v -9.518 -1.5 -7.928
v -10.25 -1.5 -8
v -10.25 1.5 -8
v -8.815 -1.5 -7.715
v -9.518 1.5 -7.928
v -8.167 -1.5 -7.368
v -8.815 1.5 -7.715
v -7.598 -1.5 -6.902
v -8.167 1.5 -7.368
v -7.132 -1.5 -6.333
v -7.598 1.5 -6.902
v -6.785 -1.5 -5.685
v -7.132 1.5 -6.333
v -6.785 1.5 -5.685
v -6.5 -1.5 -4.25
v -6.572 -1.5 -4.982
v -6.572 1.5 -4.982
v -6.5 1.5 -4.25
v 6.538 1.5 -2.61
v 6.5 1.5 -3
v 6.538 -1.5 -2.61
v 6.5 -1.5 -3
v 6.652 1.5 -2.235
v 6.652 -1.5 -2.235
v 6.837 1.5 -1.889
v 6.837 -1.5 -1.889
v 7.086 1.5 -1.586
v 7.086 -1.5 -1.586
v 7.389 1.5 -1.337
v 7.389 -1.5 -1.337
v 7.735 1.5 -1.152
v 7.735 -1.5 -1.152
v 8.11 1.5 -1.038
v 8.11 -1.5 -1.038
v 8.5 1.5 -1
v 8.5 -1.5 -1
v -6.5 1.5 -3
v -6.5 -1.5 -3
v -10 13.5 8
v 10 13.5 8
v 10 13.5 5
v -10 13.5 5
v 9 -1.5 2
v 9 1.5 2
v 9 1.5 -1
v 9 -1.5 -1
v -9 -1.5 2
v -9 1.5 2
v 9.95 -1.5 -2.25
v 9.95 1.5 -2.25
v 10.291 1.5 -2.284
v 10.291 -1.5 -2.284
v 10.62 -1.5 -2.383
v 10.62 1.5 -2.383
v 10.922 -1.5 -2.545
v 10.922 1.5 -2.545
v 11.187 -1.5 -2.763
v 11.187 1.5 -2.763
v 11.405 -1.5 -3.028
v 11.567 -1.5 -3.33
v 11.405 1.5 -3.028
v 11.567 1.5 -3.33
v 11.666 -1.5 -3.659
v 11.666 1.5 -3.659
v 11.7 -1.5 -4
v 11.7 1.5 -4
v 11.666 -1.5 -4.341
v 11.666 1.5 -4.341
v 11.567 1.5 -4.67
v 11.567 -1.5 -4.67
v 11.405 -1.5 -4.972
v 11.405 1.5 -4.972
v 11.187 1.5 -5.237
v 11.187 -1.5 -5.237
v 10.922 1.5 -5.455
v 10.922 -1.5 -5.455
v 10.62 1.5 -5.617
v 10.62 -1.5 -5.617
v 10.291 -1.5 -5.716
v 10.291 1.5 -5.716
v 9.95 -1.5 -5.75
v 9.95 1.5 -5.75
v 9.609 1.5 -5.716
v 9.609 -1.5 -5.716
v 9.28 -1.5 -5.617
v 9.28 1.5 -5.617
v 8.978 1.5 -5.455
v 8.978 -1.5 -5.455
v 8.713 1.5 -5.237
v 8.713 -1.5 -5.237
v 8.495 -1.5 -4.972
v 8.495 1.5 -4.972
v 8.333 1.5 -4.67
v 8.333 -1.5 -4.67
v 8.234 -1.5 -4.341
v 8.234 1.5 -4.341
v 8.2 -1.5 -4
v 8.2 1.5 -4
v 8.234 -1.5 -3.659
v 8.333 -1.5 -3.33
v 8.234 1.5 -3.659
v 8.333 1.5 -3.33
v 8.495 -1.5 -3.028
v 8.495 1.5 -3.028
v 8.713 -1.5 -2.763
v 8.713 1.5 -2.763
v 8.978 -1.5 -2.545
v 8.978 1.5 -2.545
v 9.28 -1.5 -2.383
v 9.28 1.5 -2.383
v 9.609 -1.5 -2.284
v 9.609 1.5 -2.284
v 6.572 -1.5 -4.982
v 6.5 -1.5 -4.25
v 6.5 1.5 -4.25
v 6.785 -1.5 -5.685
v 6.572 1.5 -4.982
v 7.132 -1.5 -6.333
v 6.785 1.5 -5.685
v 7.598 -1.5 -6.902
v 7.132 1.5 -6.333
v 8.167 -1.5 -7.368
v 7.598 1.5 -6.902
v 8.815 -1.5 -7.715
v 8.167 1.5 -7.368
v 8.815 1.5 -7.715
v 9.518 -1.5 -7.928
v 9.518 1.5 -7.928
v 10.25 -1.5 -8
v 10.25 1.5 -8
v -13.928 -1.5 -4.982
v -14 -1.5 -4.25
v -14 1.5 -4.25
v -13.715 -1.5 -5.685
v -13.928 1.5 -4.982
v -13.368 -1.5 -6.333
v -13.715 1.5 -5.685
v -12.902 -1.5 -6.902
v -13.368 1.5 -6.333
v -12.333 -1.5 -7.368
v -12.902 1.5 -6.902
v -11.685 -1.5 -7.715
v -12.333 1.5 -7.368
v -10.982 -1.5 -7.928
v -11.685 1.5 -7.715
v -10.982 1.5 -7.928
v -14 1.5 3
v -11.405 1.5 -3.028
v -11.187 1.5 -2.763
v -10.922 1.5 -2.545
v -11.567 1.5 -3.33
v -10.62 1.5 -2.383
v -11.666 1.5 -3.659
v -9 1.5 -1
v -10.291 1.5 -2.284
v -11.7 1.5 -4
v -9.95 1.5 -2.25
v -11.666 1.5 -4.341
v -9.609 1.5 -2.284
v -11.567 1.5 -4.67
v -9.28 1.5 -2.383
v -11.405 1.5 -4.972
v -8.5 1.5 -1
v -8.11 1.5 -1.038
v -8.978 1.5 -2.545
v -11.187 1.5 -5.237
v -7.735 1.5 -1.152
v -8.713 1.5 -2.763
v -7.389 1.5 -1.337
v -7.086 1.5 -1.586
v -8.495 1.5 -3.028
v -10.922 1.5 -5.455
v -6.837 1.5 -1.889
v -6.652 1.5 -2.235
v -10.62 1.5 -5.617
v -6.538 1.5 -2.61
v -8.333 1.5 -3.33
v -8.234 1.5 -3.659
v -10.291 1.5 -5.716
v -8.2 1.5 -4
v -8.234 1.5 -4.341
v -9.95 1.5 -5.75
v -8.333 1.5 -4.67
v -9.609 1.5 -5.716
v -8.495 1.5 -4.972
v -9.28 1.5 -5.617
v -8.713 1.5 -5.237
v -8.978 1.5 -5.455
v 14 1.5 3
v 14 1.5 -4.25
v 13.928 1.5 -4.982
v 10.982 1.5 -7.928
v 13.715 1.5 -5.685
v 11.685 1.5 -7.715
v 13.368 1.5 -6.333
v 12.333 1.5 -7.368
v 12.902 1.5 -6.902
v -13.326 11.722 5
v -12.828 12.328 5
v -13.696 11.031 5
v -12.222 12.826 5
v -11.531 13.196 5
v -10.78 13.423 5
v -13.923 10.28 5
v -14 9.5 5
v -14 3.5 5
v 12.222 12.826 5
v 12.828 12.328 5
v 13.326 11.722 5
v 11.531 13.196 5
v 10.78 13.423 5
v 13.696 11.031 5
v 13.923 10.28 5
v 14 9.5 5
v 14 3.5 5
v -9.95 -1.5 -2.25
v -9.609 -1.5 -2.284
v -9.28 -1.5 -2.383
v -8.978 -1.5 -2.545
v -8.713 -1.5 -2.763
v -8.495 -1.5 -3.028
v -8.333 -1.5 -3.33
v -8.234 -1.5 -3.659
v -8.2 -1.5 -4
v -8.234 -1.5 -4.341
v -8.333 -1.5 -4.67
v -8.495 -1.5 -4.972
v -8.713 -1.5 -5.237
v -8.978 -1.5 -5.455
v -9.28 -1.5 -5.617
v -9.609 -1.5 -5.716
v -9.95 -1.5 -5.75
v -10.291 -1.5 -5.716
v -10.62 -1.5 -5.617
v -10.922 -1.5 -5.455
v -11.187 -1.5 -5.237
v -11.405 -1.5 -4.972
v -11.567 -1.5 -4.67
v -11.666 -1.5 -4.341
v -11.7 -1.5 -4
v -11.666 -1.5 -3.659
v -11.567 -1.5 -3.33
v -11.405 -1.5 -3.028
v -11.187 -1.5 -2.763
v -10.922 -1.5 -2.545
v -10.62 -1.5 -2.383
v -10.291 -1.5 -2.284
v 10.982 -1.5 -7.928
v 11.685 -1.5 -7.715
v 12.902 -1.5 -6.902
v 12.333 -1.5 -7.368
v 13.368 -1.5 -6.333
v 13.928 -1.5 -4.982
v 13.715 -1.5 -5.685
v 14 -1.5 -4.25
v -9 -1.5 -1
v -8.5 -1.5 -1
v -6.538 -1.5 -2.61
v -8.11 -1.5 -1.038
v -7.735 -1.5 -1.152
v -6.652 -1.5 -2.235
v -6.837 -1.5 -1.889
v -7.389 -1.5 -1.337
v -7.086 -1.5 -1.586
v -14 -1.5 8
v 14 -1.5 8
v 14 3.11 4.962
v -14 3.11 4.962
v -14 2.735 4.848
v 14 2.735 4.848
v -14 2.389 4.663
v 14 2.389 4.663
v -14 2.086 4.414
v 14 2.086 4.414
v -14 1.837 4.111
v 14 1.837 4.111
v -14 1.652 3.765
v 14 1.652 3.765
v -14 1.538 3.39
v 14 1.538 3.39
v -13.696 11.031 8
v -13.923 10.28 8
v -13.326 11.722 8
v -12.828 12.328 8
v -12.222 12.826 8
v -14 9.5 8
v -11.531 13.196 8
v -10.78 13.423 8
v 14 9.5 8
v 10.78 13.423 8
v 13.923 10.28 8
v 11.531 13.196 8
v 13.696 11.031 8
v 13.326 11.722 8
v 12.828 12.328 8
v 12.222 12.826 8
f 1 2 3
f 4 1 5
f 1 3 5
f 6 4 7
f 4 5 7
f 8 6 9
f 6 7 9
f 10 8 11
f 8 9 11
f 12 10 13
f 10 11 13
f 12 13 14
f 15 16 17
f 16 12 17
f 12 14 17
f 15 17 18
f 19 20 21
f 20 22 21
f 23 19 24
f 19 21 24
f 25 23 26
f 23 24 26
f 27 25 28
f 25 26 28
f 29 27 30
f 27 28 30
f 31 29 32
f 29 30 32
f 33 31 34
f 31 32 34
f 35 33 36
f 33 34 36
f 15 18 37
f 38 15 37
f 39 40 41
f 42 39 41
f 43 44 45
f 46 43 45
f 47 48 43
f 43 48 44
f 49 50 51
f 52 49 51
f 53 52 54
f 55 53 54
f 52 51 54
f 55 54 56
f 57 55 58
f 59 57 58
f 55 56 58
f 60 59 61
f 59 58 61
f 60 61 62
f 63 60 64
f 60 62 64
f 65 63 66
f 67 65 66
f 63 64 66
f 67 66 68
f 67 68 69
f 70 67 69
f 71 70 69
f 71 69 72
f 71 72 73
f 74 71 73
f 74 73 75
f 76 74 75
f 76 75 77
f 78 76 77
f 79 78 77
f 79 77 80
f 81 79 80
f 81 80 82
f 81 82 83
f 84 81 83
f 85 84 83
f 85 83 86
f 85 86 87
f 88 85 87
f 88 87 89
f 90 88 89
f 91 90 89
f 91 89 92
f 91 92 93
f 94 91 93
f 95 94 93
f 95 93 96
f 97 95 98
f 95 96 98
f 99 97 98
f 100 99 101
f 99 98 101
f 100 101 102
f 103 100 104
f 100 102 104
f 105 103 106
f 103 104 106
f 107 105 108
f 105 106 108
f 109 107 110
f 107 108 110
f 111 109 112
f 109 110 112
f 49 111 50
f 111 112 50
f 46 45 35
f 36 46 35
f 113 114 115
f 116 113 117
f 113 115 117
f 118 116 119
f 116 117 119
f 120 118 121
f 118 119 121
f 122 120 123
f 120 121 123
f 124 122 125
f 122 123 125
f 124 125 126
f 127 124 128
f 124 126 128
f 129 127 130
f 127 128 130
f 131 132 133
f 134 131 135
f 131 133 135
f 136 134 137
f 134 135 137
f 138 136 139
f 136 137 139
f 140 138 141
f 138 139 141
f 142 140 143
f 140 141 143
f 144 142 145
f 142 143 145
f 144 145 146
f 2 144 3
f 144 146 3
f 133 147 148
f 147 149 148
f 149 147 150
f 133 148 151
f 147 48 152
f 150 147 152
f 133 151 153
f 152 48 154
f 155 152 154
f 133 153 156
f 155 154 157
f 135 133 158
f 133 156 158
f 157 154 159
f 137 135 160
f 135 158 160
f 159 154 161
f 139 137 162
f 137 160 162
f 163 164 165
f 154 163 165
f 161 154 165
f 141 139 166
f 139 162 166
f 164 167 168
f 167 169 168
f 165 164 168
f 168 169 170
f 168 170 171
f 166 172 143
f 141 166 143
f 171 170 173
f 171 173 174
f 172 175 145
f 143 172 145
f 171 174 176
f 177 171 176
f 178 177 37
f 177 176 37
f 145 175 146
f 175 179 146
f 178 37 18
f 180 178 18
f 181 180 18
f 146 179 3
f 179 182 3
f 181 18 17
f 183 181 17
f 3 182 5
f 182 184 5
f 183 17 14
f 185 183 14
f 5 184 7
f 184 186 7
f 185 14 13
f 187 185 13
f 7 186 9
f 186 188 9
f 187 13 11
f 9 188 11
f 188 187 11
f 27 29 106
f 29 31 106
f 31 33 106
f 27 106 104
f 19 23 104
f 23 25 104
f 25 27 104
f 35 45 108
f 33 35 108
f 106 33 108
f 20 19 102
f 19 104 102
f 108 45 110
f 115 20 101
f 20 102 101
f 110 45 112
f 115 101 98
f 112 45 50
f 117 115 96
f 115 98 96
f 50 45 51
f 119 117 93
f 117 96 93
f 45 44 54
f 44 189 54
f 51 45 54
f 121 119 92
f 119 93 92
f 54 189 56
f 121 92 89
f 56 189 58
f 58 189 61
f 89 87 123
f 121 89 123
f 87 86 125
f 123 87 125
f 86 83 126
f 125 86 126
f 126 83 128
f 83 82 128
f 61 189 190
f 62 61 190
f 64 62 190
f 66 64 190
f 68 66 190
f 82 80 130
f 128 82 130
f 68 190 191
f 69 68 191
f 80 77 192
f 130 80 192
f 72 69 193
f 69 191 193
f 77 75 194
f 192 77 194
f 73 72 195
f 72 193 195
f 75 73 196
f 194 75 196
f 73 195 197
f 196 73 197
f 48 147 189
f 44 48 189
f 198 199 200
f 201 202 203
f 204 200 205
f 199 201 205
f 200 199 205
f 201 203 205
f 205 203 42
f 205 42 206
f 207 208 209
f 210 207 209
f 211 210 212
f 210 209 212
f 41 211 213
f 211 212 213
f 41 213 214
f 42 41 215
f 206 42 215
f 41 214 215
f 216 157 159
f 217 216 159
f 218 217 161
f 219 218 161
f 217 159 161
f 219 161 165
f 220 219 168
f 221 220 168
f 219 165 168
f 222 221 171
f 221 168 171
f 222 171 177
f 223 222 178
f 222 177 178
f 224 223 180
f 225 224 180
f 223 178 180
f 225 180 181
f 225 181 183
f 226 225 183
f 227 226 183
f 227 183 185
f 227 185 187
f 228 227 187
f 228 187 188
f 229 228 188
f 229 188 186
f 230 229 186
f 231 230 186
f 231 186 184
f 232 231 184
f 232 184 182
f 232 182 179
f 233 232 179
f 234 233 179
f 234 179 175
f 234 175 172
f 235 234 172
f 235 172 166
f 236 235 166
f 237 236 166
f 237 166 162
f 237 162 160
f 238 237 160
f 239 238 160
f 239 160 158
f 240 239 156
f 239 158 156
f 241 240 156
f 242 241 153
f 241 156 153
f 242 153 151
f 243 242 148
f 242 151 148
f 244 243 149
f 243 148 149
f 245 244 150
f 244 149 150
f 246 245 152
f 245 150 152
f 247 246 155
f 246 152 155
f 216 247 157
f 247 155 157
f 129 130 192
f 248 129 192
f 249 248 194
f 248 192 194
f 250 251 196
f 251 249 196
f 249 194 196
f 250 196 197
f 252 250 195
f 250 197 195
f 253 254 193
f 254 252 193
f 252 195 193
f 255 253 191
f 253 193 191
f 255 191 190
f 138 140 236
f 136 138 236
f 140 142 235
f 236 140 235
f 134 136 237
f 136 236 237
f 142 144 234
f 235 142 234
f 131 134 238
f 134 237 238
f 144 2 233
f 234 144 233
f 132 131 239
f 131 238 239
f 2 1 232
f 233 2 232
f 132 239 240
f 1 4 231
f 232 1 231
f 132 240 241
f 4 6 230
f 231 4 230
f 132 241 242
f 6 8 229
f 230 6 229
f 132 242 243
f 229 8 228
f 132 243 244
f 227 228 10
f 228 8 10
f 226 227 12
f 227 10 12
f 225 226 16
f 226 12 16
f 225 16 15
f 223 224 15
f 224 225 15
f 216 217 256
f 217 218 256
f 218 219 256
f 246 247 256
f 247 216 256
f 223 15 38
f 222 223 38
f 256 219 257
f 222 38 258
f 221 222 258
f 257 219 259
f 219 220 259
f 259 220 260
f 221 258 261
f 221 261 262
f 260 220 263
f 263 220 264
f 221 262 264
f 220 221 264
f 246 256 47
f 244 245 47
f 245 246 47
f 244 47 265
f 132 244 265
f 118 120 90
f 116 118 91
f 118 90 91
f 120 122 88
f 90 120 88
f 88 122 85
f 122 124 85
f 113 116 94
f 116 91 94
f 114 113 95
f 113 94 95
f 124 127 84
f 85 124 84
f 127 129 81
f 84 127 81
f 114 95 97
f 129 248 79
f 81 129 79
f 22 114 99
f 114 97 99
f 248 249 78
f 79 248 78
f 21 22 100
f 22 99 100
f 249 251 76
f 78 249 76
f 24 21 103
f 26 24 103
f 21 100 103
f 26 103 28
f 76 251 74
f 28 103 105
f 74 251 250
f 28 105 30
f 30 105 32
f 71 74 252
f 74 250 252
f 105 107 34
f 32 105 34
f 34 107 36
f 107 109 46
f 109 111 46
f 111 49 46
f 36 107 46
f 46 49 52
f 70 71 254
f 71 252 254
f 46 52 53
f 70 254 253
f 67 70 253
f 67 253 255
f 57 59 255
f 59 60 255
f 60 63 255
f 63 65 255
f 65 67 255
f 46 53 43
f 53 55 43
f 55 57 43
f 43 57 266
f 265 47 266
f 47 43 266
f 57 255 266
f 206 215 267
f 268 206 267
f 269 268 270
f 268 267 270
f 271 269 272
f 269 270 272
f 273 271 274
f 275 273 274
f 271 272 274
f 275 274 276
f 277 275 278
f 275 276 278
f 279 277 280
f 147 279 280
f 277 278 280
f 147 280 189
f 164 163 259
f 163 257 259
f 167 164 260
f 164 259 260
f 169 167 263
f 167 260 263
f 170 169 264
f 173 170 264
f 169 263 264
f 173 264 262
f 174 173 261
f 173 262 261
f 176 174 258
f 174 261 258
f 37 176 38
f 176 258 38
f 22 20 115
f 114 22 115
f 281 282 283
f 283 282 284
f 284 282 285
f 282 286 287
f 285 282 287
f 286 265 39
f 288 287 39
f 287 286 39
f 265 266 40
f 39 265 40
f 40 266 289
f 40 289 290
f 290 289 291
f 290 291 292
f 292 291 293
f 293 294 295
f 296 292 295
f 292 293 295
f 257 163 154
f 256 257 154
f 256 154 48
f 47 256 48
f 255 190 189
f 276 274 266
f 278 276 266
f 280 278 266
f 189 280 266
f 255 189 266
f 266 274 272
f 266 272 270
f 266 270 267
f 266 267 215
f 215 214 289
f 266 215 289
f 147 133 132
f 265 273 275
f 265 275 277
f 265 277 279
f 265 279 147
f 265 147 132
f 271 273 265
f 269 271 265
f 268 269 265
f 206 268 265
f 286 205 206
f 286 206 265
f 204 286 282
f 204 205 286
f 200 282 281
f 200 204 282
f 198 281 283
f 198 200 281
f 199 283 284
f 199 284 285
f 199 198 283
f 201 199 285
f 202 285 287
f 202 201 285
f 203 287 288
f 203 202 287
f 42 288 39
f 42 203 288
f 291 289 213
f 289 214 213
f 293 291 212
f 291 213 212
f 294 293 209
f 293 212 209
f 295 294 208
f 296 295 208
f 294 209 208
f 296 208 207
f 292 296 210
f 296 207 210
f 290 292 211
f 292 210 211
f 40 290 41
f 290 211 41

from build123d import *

# Parameters (mm, degrees)
SALIENTE_EXTRUIR1_DEPTH = 14
CROQUIS3_R              = 1.75
CORTAR_EXTRUIR1_DEPTH   = 30
REDONDEO3_R             = 4
REDONDEO4_R             = 2


with BuildPart() as part:
    # Croquis2 → Saliente-Extruir1 (new, symmetric)
    with BuildSketch(Plane(origin=(0, 0, 0), x_dir=(0, 0, -1), z_dir=(1, 0, 0))):
        with BuildLine():
            Line((-3, 1.5), (8, 1.5))
            Line((8, 1.5), (8, -1.5))
            Line((8, -1.5), (-8, -1.5))
            Line((-8, -1.5), (-8, 1.5))
            Line((-8, 1.5), (-8, 13.5))
            Line((-8, 13.5), (-5, 13.5))
            Line((-5, 13.5), (-5, 3.5))
            ThreePointArc((-5, 3.5), (-4.414213562, 2.085786438), (-3, 1.5))
        make_face()
    extrude(amount=SALIENTE_EXTRUIR1_DEPTH, both=True)

    # Croquis3 → Cortar-Extruir1 (cut)
    with BuildSketch(Plane(origin=(0, 1.5, 0), x_dir=(1, 0, 0), z_dir=(0, 1, 0))):
        with BuildLine():
            Line((-9, -2), (9, -2))
            Line((9, -2), (9, 1))
            Line((9, 1), (6.5, 1))
            Line((6.5, 1), (6.5, 4.25))
            ThreePointArc((6.5, 4.25), (7.598349575, 6.901650434), (10.250000013, 8))
            Line((10.250000013, 8), (6.5, 8))
            Line((6.5, 8), (-6.5, 8))
            Line((-6.5, 8), (-10.249999997, 8))
            ThreePointArc((-10.249999997, 8), (-7.598349569, 6.901650428), (-6.5, 4.25))
            Line((-6.5, 4.25), (-6.5, 1))
            Line((-6.5, 1), (-9, 1))
            Line((-9, 1), (-9, -2))
        make_face()
        with BuildLine():
            Line((14, 8), (10.250000013, 8))
            ThreePointArc((10.250000013, 8), (12.901650434, 6.901650425), (14, 4.25))
            Line((14, 4.25), (14, 8))
        make_face()
        with BuildLine():
            ThreePointArc((-14, 4.25), (-12.901650428, 6.901650431), (-10.249999997, 8))
            Line((-10.249999997, 8), (-14, 8))
            Line((-14, 8), (-14, 4.25))
        make_face()
        with Locations(Location((9.95, 4, 0), (0, 0, 270))):
            Circle(CROQUIS3_R)
        with Locations(Location((-9.95, 4, 0), (0, 0, 270))):
            Circle(CROQUIS3_R)
    extrude(amount=-CORTAR_EXTRUIR1_DEPTH, mode=Mode.SUBTRACT)

    # Redondeo3
    redondeo3_edges = [part.edges().sort_by_distance(p)[0] for p in [
        (-14, 13.5, 6.5),
        (14, 13.5, 6.5),
    ]]
    fillet(redondeo3_edges, radius=REDONDEO3_R)

    # Redondeo4
    redondeo4_edges = [part.edges().sort_by_distance(p)[0] for p in [
        (6.5, 0, -1),
        (-6.5, 0, -1),
    ]]
    fillet(redondeo4_edges, radius=REDONDEO4_R)


solid = part.part
